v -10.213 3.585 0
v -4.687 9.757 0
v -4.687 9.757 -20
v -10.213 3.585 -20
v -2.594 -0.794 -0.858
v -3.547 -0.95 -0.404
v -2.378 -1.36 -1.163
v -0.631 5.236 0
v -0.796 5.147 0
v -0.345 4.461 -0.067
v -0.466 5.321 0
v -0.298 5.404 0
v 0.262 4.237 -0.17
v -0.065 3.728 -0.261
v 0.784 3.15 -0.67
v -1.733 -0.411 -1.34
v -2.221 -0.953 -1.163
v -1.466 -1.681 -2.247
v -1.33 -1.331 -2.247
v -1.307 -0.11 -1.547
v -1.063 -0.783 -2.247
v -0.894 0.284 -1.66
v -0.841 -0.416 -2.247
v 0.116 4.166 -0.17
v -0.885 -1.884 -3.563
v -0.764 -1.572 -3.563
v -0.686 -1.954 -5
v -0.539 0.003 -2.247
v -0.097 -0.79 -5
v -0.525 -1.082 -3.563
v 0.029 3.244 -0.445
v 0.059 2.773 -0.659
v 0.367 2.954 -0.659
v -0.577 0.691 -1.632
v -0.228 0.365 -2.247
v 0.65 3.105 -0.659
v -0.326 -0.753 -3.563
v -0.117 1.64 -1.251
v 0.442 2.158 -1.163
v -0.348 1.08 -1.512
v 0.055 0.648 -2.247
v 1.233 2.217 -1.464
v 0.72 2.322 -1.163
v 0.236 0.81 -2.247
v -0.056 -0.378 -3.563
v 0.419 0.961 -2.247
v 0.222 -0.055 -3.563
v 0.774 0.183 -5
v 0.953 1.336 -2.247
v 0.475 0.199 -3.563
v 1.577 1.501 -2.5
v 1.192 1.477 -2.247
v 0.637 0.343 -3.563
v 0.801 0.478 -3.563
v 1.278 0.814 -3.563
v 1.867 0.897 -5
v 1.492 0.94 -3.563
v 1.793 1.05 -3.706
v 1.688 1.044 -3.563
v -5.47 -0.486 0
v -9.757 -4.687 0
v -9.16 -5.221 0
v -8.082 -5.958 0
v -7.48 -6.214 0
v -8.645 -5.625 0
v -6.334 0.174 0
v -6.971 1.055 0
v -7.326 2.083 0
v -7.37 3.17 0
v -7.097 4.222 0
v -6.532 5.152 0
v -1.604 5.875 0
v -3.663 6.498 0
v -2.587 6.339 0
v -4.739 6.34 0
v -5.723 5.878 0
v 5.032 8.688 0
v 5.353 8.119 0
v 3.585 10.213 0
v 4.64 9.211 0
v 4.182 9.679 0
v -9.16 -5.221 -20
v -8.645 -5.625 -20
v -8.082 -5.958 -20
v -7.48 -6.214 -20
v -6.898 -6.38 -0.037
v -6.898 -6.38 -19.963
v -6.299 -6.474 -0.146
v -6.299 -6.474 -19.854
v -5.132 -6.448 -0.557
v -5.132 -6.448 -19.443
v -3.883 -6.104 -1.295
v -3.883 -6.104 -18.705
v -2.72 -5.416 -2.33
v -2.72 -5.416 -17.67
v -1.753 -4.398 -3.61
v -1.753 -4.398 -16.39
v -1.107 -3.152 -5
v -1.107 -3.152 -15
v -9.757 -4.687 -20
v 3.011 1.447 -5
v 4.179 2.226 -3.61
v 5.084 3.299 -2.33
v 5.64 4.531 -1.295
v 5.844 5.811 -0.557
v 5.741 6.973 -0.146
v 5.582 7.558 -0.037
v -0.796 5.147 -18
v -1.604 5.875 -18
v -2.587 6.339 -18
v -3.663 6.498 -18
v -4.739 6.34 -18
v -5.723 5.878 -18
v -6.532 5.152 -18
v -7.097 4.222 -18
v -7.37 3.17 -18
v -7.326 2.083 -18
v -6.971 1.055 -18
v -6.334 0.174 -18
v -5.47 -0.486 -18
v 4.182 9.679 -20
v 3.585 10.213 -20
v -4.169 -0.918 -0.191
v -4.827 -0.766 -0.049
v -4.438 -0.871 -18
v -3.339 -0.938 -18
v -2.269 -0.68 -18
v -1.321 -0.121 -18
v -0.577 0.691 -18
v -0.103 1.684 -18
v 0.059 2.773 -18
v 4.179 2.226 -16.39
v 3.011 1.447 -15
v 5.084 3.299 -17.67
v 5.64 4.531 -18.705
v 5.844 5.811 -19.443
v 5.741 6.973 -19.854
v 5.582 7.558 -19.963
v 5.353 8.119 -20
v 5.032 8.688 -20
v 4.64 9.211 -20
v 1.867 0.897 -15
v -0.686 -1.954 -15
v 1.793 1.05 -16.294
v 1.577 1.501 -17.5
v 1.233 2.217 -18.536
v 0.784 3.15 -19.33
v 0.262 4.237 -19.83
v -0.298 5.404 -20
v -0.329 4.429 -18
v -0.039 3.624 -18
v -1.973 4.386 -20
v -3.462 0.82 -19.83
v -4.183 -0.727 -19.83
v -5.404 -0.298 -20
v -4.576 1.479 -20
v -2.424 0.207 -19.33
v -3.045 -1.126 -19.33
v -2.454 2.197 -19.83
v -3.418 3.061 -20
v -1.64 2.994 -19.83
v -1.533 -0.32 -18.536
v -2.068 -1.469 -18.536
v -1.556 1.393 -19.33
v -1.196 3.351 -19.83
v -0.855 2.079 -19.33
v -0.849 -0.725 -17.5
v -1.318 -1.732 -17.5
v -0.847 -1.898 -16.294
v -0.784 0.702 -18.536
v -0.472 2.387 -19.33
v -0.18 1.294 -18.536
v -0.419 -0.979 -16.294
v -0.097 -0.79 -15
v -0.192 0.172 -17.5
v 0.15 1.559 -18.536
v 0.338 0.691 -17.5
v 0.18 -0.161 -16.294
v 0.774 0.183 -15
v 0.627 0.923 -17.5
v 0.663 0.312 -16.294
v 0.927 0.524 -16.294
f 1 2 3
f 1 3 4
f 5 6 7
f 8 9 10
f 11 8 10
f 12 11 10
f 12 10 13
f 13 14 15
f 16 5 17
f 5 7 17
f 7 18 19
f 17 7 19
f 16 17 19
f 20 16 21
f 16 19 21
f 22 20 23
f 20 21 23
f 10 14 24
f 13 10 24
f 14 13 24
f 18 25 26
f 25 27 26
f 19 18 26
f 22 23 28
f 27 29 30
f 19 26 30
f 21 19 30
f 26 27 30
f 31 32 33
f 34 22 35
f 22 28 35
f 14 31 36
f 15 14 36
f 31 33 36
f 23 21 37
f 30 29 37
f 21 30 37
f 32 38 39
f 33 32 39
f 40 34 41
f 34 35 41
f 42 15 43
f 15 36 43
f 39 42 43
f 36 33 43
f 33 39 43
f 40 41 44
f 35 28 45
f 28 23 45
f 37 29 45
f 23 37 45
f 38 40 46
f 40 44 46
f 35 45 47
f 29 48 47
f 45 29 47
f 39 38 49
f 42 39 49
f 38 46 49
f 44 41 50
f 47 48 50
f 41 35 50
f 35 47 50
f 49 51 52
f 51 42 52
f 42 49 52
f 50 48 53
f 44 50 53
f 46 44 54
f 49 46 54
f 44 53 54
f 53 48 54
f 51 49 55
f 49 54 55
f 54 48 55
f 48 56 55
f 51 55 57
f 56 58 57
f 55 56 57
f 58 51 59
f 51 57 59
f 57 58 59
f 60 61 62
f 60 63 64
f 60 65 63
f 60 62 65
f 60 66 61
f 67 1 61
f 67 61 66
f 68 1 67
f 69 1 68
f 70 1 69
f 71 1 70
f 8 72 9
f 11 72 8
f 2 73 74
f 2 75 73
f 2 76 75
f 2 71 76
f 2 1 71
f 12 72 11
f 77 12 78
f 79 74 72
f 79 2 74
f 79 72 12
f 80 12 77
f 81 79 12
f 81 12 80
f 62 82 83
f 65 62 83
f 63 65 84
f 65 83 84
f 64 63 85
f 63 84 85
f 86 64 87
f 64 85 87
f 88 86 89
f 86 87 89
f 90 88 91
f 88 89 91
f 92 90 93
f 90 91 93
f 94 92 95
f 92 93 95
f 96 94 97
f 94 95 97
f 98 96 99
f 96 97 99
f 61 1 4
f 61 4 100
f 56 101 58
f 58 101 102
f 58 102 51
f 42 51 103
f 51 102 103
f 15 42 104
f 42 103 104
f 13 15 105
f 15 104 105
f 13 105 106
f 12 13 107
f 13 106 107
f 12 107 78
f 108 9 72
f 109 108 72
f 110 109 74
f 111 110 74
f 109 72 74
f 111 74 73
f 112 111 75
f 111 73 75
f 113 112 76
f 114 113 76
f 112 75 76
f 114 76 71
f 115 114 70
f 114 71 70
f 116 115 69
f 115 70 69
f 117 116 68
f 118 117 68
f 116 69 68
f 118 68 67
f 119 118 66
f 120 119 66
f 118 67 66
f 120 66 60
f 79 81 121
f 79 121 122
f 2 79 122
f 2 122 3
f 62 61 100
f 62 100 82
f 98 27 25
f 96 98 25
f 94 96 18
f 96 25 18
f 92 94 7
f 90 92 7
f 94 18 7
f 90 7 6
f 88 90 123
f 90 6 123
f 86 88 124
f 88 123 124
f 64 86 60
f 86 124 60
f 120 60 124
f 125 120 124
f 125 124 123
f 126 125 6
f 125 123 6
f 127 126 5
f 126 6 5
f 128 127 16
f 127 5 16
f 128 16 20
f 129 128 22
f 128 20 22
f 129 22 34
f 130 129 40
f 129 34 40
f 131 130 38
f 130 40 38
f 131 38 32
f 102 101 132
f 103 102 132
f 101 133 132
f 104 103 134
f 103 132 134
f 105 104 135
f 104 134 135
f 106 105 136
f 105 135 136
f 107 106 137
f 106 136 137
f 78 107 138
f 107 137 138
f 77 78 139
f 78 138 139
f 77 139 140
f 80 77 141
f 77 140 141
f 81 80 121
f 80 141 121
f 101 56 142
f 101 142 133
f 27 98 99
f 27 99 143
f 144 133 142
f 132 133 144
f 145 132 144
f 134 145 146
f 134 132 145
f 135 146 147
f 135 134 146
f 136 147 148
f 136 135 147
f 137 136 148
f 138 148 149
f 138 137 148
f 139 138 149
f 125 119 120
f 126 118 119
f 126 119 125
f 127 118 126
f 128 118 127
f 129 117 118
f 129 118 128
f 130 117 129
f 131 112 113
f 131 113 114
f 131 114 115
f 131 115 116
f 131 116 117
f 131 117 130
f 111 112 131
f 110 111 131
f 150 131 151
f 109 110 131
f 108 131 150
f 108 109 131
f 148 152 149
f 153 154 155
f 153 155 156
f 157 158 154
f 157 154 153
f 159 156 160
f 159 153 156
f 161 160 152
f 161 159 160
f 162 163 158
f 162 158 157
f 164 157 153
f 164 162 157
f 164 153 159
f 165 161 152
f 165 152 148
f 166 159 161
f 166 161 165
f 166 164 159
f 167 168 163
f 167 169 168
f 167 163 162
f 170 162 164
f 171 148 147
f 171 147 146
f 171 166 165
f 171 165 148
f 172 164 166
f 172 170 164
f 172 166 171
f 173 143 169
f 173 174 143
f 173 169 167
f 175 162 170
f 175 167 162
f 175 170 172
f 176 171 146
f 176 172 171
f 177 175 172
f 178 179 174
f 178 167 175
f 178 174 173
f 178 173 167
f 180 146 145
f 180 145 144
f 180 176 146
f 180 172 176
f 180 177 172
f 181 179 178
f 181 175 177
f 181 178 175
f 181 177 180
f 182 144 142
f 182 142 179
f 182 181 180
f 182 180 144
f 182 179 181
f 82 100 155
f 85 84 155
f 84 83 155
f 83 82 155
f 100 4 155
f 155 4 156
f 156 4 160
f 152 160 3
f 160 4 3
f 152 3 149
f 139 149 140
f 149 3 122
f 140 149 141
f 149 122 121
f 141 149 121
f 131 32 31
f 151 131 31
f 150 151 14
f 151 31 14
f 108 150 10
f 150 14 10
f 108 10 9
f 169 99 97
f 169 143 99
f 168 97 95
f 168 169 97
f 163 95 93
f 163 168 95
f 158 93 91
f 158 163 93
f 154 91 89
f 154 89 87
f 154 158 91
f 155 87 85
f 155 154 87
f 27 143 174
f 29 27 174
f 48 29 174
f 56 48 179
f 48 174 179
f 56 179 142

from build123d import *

# Parameters (mm, degrees)
F1_DEPTH = 20
F2_R     = 5
F4_DEPTH = 18


with BuildPart() as f1:
    # F0 (on Top) → F1 (new body)
    with BuildSketch(Plane.XY):
        Polygon((3.5849593993, 10.2129992476), (-4.6867319226, 9.7566301257), (-10.2129992476, 3.5849593993), (-9.7566301257, -4.6867319226), (-3.5849593993, -10.2129992476), (0, 0), (9.7566301257, 4.6867319226), align=None)
    extrude(amount=-F1_DEPTH)

    # F2
    f2_edges = [f1.edges().sort_by_distance(p)[0] for p in [
        (-3.584959, -10.212999, -10),
        (0, 0, -10),
        (-1.79248, -5.1065, 0),
        (-1.79248, -5.1065, -20),
        (9.75663, 4.686732, -10),
        (4.878315, 2.343366, 0),
        (4.878315, 2.343366, -20),
    ]]
    fillet(f2_edges, radius=F2_R)

    # F3 (on face) → F4 (cut)
    with BuildSketch(Plane.XY):
        with BuildLine():
            ThreePointArc((-5.4696709775, -0.4859568461), (-1.774196959, -0.43586708), (0.0592308539, 2.7731171302))
            ThreePointArc((0.0592308539, 2.7731171302), (-0.1609705435, 4.0348666123), (-0.7955405584, 5.1474407928))
            ThreePointArc((-0.7955405584, 5.1474407928), (-3.6017445612, 2.8495453067), (-5.4037427691, -0.2981374964))
            Line((-5.4037427691, -0.2981374964), (-5.4696709775, -0.4859568461))
        make_face()
        with BuildLine():
            ThreePointArc((-5.4037427691, -0.2981374964), (-3.6017445612, 2.8495453067), (-0.7955405584, 5.1474407928))
            ThreePointArc((-0.7955405584, 5.1474407928), (-6.5324842395, 5.1516817337), (-5.4696709775, -0.4859568461))
            Line((-5.4696709775, -0.4859568461), (-5.4037427691, -0.2981374964))
        make_face()
    extrude(amount=-F4_DEPTH, mode=Mode.SUBTRACT)


solid = f1.part
